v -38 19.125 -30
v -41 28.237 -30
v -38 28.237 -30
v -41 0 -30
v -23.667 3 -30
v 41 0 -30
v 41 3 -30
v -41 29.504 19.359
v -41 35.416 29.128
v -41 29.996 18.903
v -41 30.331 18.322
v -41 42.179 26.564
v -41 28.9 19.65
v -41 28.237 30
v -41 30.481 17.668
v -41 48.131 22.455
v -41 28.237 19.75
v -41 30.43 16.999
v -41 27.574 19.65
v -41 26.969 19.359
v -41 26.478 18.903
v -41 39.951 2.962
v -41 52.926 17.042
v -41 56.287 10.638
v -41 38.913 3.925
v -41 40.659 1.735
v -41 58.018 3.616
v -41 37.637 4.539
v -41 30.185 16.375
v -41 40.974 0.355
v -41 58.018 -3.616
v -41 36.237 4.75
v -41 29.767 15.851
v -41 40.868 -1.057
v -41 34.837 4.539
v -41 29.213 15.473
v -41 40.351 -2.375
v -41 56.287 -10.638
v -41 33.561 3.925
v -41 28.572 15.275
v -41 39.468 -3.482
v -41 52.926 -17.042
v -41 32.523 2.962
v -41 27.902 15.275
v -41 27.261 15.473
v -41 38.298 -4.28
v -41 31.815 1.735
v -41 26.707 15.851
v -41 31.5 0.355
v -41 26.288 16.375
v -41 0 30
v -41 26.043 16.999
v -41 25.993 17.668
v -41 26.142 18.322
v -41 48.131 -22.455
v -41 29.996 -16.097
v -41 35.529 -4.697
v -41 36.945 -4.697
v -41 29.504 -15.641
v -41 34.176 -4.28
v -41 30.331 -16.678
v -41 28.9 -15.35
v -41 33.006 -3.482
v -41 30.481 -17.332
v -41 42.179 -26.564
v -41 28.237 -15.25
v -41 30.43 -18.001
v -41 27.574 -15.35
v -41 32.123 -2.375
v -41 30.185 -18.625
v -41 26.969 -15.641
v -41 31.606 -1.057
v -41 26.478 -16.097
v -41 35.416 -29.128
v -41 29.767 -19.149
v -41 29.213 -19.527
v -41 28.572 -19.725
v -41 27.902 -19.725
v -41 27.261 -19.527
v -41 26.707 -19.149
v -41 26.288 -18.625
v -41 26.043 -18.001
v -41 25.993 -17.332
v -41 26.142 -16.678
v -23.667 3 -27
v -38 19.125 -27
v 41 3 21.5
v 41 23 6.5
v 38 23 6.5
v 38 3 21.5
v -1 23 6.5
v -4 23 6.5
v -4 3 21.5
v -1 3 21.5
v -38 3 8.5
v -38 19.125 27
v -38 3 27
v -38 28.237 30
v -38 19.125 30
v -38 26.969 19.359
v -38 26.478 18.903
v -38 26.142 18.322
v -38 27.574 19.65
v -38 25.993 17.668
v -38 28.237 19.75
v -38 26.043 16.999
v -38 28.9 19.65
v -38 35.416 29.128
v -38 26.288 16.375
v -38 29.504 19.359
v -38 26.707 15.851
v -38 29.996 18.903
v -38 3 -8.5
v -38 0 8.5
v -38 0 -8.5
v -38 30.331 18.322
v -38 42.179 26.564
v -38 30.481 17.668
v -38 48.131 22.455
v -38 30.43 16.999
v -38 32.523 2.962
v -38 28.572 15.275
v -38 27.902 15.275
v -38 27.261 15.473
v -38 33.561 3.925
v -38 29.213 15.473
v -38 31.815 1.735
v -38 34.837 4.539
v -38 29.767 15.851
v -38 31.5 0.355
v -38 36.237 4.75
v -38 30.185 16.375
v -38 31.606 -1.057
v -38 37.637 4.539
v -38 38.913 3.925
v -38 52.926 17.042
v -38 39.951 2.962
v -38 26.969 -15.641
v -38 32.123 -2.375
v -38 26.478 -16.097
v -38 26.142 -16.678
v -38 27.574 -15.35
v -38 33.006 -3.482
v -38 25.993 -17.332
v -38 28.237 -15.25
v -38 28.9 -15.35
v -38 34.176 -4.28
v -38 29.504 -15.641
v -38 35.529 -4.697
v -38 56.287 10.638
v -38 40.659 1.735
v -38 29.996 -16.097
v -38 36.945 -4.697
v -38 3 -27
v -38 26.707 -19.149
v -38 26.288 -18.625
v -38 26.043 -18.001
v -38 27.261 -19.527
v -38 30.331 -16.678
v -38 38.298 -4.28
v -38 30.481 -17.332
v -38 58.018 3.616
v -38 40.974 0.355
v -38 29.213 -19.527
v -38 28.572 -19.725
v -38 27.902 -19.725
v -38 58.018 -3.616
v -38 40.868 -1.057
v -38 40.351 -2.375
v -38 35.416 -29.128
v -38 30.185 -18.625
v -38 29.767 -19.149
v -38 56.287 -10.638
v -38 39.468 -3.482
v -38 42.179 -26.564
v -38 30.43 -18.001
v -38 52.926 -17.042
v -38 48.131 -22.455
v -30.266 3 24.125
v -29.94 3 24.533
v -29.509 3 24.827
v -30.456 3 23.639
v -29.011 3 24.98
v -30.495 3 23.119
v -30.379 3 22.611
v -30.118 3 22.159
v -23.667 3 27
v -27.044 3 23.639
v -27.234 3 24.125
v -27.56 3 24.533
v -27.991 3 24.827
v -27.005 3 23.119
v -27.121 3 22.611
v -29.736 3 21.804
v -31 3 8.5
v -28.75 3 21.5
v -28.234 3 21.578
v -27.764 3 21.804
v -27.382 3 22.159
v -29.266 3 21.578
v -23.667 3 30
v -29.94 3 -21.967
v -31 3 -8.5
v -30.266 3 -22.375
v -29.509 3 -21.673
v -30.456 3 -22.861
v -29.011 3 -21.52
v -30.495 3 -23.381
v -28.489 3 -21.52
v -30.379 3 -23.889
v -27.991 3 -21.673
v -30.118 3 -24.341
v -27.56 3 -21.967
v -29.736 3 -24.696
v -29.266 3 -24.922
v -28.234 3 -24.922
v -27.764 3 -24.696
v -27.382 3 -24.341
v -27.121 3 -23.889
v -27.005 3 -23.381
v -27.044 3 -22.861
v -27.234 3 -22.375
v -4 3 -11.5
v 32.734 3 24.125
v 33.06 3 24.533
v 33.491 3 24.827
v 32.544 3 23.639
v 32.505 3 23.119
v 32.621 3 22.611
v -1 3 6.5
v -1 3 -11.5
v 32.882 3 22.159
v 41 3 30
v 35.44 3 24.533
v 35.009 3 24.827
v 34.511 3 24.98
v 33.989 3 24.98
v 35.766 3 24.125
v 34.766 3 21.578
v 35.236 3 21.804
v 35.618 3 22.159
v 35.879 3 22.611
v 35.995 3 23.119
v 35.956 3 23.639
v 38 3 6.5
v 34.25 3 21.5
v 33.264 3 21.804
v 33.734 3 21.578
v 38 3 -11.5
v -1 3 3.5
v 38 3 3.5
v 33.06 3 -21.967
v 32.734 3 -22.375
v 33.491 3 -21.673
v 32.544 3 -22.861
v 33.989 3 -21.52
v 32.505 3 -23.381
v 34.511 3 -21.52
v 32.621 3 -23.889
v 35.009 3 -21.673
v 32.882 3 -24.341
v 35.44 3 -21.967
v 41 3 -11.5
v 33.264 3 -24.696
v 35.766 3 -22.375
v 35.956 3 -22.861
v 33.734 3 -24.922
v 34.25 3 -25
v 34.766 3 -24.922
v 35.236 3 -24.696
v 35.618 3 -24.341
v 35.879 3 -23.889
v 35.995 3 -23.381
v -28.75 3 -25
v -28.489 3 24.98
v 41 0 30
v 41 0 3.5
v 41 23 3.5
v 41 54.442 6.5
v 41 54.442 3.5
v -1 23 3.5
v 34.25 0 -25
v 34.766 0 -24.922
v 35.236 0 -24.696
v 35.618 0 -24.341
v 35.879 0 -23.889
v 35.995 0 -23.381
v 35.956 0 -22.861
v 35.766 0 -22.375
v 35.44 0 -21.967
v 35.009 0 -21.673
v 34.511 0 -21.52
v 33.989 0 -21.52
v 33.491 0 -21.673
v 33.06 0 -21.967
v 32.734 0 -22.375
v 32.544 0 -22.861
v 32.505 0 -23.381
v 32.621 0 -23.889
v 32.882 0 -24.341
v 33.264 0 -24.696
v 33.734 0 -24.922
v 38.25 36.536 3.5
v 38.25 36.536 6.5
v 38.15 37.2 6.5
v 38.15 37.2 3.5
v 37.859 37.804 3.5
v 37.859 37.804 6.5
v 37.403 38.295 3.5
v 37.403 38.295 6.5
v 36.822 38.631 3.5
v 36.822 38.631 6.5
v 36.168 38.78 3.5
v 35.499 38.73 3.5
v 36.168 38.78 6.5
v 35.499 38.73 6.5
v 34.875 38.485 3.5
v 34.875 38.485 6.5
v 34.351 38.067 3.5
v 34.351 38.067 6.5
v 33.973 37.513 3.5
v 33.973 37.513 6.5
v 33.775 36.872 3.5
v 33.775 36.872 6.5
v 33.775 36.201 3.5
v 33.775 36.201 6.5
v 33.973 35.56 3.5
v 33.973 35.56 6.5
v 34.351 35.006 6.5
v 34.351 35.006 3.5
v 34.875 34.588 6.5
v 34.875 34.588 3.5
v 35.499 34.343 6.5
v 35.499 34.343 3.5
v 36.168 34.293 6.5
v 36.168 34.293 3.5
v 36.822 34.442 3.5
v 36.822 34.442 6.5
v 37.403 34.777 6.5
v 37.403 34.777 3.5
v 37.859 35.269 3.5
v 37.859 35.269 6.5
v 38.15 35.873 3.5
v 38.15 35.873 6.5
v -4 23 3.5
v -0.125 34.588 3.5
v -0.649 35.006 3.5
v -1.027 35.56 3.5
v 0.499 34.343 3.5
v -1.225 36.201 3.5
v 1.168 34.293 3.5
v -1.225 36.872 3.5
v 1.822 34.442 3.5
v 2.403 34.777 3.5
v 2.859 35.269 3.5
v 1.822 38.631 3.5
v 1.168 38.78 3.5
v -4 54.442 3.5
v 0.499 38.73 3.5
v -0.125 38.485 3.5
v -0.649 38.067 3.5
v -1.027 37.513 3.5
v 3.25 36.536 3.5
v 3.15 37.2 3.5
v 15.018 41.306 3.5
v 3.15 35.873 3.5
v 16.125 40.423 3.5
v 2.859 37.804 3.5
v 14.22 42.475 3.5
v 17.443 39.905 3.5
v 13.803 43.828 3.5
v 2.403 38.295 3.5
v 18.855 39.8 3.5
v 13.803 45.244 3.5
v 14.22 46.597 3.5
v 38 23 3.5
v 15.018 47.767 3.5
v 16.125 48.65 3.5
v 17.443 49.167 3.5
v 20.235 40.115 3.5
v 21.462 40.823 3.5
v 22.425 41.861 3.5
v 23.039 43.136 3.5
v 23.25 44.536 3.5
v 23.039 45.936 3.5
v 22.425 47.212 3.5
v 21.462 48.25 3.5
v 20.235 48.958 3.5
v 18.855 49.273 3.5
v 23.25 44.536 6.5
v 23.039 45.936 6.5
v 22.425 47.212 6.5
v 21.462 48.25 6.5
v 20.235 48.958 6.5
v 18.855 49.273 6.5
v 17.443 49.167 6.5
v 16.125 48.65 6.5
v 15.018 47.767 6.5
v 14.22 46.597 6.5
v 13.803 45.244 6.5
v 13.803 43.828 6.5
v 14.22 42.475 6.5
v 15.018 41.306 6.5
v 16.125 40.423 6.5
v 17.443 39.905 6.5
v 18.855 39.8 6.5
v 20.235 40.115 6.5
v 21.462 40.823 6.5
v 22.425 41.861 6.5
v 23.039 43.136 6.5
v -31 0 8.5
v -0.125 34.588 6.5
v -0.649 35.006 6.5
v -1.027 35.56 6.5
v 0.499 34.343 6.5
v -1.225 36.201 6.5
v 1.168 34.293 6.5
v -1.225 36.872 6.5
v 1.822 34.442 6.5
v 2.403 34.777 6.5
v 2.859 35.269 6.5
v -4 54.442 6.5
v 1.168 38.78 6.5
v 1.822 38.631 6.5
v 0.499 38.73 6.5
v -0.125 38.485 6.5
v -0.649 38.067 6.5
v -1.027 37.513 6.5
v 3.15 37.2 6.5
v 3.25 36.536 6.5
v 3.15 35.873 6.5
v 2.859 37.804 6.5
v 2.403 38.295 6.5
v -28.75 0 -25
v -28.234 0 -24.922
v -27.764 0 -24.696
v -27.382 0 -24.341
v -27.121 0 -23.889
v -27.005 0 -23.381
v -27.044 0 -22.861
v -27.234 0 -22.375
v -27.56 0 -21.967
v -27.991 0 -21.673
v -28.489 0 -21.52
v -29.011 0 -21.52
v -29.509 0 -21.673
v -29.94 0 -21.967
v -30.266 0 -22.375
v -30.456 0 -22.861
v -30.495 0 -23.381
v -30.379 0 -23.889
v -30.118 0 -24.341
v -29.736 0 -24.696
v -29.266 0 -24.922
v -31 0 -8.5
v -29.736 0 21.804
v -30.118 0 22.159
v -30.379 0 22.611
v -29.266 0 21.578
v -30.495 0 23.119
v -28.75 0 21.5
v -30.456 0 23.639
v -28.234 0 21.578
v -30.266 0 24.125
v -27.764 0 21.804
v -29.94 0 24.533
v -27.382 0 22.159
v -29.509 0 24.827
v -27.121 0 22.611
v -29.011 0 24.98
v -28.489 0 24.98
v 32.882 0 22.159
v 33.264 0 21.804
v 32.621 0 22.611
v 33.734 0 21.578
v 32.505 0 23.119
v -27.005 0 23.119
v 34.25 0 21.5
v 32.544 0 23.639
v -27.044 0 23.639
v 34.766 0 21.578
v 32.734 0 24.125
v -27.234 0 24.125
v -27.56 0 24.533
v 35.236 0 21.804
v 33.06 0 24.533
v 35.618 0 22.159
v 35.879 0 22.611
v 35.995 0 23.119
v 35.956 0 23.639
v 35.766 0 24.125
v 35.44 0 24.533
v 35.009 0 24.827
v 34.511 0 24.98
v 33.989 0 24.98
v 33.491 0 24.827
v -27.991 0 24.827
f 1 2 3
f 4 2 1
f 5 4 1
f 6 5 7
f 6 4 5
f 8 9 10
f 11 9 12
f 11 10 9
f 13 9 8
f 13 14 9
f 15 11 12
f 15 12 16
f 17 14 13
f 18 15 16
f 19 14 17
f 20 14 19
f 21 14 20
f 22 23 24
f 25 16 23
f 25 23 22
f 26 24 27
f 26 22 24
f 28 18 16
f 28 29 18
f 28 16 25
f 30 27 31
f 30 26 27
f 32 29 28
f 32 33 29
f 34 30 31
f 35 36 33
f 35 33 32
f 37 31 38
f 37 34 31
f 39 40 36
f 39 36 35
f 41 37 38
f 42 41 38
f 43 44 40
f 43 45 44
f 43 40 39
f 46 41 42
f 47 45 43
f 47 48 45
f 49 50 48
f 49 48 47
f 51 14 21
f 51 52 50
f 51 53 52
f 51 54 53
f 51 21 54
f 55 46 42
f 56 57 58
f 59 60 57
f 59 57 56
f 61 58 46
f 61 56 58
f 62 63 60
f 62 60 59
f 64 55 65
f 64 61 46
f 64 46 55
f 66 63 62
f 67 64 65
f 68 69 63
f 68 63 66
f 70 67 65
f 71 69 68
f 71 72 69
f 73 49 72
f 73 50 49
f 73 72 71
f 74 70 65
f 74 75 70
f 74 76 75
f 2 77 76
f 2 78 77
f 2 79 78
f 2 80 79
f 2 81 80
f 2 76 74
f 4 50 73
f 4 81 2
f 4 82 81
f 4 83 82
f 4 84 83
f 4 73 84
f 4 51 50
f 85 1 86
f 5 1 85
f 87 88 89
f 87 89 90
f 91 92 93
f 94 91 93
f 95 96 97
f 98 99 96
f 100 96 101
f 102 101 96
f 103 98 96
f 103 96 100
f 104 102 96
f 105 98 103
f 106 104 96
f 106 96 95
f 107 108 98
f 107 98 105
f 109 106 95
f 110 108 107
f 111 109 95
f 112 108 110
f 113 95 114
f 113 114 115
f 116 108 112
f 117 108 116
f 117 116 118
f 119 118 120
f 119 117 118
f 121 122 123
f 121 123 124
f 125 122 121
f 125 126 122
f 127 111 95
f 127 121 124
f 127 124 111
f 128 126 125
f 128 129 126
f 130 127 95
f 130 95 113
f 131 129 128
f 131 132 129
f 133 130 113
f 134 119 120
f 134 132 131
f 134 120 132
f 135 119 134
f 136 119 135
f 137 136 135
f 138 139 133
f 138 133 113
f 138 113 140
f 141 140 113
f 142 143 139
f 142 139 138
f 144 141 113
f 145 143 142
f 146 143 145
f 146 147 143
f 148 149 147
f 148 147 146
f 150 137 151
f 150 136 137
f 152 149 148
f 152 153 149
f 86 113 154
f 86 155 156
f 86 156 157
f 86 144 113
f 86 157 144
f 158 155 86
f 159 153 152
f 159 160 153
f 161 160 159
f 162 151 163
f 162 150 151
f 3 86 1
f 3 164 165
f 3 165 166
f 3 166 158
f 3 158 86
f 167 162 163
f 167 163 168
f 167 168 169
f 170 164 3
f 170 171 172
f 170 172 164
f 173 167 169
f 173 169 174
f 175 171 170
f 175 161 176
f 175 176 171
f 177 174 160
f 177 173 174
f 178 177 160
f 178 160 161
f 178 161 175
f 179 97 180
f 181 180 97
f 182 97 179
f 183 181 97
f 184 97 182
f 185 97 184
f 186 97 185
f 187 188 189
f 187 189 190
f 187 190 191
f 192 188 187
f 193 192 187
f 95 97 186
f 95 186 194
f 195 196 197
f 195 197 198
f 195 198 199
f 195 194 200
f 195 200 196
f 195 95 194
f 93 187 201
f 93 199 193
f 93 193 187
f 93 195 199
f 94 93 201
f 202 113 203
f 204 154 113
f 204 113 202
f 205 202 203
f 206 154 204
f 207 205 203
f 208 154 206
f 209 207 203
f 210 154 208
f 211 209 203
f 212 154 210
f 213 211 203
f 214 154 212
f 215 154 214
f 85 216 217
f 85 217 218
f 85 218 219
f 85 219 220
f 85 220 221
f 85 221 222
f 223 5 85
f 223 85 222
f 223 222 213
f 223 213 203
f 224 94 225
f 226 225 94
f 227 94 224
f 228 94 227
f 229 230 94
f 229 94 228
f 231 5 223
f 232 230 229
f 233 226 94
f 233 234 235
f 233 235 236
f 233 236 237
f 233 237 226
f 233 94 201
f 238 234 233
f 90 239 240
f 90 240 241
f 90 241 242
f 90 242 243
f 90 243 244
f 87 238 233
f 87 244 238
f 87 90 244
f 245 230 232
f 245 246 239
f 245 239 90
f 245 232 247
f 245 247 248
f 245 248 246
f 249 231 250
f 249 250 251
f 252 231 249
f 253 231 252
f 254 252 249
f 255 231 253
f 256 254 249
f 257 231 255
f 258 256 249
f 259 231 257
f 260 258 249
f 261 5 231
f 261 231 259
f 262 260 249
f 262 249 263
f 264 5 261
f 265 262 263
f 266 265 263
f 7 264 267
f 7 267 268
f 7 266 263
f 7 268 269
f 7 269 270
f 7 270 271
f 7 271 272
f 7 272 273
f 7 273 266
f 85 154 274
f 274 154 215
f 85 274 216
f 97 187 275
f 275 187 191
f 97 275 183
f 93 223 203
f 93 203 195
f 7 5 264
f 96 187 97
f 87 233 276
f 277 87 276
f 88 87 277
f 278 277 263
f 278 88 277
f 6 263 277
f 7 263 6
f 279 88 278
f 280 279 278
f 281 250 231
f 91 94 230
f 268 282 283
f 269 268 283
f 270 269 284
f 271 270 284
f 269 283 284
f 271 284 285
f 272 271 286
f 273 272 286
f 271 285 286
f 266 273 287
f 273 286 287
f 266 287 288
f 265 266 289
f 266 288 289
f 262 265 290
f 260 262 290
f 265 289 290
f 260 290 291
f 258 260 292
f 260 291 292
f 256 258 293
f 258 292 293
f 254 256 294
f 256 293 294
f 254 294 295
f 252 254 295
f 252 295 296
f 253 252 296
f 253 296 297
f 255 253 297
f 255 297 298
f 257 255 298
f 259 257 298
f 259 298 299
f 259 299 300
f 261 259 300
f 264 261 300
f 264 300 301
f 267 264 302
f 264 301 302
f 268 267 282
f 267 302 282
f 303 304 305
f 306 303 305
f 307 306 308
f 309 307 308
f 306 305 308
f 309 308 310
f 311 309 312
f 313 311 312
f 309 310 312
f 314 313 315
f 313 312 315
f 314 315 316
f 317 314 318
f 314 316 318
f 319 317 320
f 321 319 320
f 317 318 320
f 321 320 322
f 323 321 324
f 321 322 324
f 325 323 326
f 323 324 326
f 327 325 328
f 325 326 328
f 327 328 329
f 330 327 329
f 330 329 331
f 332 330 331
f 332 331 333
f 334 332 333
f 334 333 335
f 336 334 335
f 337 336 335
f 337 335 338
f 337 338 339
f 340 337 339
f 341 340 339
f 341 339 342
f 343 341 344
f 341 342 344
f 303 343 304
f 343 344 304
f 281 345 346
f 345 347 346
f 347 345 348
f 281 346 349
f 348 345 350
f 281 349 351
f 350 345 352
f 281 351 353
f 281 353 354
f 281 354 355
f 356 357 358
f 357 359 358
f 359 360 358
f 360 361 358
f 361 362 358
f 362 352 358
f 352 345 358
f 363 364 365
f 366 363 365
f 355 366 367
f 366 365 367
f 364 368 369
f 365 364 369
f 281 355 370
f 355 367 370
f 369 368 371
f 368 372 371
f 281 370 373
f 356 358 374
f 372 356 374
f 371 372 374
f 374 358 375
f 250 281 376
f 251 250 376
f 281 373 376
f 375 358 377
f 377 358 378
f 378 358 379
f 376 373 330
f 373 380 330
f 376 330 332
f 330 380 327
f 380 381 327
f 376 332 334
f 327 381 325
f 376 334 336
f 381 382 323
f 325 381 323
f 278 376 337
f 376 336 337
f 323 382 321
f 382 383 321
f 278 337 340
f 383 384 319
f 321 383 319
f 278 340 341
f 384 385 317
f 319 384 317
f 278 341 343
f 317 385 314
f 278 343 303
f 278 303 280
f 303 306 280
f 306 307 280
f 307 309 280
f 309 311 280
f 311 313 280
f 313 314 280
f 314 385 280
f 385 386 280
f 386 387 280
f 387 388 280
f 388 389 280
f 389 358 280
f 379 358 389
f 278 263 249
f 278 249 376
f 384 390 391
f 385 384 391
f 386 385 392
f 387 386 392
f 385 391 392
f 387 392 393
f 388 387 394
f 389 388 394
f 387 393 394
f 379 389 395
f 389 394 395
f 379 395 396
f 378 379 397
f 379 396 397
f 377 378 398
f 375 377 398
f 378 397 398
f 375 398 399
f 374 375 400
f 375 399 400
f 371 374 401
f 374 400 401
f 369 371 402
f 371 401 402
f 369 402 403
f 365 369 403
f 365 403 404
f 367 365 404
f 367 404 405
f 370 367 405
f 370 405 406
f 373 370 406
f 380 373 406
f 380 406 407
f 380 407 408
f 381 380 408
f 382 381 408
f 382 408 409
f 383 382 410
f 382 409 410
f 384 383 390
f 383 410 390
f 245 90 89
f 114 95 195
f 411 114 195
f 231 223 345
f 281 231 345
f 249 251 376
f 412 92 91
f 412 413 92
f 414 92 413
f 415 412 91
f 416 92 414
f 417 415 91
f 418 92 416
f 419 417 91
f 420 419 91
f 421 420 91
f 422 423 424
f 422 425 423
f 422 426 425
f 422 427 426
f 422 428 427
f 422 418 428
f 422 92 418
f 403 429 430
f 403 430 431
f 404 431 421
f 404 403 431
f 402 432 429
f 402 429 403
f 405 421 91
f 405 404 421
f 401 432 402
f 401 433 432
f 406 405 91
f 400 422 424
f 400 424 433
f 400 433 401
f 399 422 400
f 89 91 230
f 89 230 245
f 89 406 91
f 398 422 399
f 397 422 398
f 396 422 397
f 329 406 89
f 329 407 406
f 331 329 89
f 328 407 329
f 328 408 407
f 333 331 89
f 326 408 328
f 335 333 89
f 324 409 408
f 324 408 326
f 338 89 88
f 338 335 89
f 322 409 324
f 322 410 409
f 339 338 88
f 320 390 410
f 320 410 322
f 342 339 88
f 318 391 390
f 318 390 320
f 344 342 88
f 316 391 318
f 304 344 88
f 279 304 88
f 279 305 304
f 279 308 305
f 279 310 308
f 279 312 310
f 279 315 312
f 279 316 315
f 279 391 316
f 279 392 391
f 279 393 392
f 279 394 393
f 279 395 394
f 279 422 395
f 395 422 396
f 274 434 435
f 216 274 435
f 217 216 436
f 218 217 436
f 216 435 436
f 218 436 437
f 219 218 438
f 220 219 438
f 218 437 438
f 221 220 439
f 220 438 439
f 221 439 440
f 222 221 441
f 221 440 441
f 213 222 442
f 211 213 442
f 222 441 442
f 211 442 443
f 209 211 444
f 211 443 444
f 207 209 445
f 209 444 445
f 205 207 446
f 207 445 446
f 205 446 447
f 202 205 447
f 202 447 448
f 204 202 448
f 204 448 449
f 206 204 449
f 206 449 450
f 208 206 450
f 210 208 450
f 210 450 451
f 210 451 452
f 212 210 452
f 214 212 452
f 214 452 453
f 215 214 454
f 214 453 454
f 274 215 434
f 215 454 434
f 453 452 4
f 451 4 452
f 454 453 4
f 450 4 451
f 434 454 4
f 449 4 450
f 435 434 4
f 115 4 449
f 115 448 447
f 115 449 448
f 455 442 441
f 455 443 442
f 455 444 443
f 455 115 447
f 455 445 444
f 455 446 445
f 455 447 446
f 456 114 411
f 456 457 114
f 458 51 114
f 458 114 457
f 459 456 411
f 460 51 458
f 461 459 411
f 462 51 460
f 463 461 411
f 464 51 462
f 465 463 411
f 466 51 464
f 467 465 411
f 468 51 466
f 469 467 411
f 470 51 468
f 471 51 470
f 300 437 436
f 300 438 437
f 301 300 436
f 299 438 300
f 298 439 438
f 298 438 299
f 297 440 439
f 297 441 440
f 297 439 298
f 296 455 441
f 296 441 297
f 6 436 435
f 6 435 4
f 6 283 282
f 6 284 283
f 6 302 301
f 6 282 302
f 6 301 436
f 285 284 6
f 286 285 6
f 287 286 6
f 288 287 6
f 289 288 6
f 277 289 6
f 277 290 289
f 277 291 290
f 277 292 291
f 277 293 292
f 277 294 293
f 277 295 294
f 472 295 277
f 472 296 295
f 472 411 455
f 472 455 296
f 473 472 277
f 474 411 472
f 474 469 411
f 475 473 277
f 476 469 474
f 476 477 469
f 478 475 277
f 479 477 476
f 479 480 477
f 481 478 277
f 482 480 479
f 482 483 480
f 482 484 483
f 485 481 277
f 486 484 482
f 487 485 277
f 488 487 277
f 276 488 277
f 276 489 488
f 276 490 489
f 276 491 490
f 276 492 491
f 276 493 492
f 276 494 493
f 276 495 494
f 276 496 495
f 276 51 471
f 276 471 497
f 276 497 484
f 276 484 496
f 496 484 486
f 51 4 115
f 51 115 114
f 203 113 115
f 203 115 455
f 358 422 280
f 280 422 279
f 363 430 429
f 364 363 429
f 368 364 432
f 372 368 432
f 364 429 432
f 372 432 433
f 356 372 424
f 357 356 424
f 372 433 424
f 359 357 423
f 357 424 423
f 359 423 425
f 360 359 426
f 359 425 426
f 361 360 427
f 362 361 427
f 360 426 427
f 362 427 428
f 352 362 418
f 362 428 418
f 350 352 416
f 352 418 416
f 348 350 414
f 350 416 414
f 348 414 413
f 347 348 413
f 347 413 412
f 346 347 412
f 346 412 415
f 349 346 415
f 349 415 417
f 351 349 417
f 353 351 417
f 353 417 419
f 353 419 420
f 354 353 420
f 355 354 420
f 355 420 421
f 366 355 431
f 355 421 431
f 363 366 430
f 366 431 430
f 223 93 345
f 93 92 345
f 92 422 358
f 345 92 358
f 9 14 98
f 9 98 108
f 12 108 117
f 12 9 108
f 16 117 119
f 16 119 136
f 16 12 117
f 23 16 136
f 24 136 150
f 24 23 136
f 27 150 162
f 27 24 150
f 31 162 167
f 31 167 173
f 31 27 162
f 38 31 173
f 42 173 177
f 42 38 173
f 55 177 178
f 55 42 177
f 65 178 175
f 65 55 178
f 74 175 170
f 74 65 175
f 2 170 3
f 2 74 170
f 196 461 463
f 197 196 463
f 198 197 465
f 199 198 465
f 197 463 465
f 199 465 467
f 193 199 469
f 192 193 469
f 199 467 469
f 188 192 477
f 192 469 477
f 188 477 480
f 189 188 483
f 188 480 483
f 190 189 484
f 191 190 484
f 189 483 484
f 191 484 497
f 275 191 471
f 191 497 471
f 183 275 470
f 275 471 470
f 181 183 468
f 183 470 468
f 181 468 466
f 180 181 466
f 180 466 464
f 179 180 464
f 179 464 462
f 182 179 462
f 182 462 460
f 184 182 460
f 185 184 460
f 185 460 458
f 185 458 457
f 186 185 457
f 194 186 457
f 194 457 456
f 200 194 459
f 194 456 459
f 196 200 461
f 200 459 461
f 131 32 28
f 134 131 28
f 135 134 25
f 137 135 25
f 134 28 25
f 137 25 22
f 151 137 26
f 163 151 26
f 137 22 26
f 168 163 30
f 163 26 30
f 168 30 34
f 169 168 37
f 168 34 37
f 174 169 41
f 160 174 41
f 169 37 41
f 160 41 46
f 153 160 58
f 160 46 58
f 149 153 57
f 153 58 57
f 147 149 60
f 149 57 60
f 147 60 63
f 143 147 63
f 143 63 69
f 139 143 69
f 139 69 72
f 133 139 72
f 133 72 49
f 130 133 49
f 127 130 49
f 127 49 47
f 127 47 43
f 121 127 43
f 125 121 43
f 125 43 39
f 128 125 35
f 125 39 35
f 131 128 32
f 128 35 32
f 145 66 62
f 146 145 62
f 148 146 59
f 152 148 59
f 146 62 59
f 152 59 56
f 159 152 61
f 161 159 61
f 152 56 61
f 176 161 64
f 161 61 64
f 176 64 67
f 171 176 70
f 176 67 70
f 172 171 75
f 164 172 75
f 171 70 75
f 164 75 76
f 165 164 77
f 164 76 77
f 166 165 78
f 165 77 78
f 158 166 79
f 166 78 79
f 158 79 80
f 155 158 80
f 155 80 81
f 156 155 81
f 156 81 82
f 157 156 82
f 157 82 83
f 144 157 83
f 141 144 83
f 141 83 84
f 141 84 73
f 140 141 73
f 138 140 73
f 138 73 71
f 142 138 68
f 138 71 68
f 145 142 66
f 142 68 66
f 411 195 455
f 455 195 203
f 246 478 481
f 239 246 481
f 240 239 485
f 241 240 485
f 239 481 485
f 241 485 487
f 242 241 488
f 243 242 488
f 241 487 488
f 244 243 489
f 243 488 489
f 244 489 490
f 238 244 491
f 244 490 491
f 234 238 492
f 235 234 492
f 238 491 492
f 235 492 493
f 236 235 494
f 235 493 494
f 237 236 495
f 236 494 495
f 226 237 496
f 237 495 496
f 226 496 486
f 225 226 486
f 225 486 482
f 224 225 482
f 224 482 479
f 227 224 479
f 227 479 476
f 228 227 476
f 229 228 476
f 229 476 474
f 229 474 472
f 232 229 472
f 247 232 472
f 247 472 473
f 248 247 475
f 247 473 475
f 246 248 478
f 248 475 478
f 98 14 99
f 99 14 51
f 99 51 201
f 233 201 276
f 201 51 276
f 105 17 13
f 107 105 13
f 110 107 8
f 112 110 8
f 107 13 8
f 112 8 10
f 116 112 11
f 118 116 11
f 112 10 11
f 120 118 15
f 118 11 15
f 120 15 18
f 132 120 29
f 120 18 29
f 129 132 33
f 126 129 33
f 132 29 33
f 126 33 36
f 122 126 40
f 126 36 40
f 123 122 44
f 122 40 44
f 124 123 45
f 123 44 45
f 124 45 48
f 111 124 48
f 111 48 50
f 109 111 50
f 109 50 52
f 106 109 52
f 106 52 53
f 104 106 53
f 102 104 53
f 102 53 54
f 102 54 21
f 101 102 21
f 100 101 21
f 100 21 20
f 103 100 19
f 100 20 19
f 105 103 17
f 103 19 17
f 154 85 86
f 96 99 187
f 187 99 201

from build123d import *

# Parameters (mm, degrees)
SKETCH1_W           = 82
SKETCH1_H           = 60
BOSS_EXTRUDE1_DEPTH = 3
BOSS_EXTRUDE2_DEPTH = 3
SKETCH3_R           = 2.25
SKETCH3_R_2         = 4.75
BOSS_EXTRUDE3_DEPTH = 3
SKETCH4_W           = 7
SKETCH4_H           = 17
CUT_EXTRUDE1_DEPTH  = 3
BOSS_EXTRUDE4_START = -23.5
SKETCH5_W           = 45
SKETCH5_H           = 54.441667663
BOSS_EXTRUDE4_DEPTH = 3
SKETCH6_R           = 2.25
SKETCH6_R_2         = 4.75
CUT_EXTRUDE2_DEPTH  = 3
BOSS_EXTRUDE5_DEPTH = 3
SKETCH8_R           = 1.75
CUT_EXTRUDE3_DEPTH  = 3


with BuildPart() as part:
    # Sketch1 → Boss-Extrude1 (new body)
    with BuildSketch(Plane(origin=(0, 0, 0), x_dir=(1, 0, 0), z_dir=(0, 1, 0))):
        Rectangle(SKETCH1_W, SKETCH1_H)
    extrude(amount=BOSS_EXTRUDE1_DEPTH)

    # Sketch2 → Boss-Extrude2 (add)
    with BuildSketch(Plane.XY.offset(30)):
        Polygon((-41, 0), (-41, 22.5), (-21, 0), align=None)
    boss_extrude2 = extrude(amount=-BOSS_EXTRUDE2_DEPTH)

    # Mirror1: Boss-Extrude2 across plane
    add(boss_extrude2.mirror(Plane.XY))

    # Sketch3 → Boss-Extrude3 (add)
    with BuildSketch(Plane.ZY.offset(41)):
        with BuildLine():
            Line((-30, 0), (30, 0))
            Line((30, 0), (30, 28.236891946))
            ThreePointArc((30, 28.236891946), (0, 58.236891946), (-30, 28.236891946))
            Line((-30, 28.236891946), (-30, 0))
        make_face()
        with Locations((-17.5, 28.236891946)):
            Circle(SKETCH3_R, mode=Mode.SUBTRACT)
        with Locations((17.5, 28.236891946)):
            Circle(SKETCH3_R, mode=Mode.SUBTRACT)
        with Locations((0, 36.236891946)):
            Circle(SKETCH3_R_2, mode=Mode.SUBTRACT)
    extrude(amount=-BOSS_EXTRUDE3_DEPTH)

    # Sketch4 → Cut-Extrude1 (cut)
    with BuildSketch(Plane(origin=(0, 3, 0), x_dir=(1, 0, 0), z_dir=(0, 1, 0))):
        with Locations((-34.5, 0)):
            Rectangle(SKETCH4_W, SKETCH4_H)
    extrude(amount=-CUT_EXTRUDE1_DEPTH, mode=Mode.SUBTRACT)

    # Sketch5 → Boss-Extrude4 (add)
    with BuildSketch(Plane.XY.offset(30).offset(BOSS_EXTRUDE4_START)):
        with Locations((18.5, 27.220833832)):
            Rectangle(SKETCH5_W, SKETCH5_H)
    extrude(amount=-BOSS_EXTRUDE4_DEPTH)

    # Sketch6 → Cut-Extrude2 (cut)
    with BuildSketch(Plane.XY.offset(6.5)):
        with Locations((1, 36.536359397)):
            Circle(SKETCH6_R)
        with Locations((36, 36.536359397)):
            Circle(SKETCH6_R)
        with Locations((18.5, 44.536359397)):
            Circle(SKETCH6_R_2)
    extrude(amount=-CUT_EXTRUDE2_DEPTH, mode=Mode.SUBTRACT)

    # Sketch7 → Boss-Extrude5 (add)
    with BuildSketch(Plane(origin=(41, 0, 0), x_dir=(0, 0, -1), z_dir=(1, 0, 0))):
        Polygon((-21.5, 3), (-6.5, 3), (-6.5, 23), align=None)
        Polygon((-3.5, 3), (11.5, 3), (-3.5, 23), align=None)
    boss_extrude5 = extrude(amount=-BOSS_EXTRUDE5_DEPTH)

    # Mirror2: Boss-Extrude5 across plane
    add(boss_extrude5.mirror(Plane.ZY.offset(-18.5)))

    # Sketch8 → Cut-Extrude3 (cut)
    with BuildSketch(Plane.XZ):
        with Locations(Location((-28.75, 23.25, 0), (0, 0, 270))):
            Circle(SKETCH8_R)
        with Locations(Location((34.25, 23.25, 0), (0, 0, 270))):
            Circle(SKETCH8_R)
        with Locations(Location((34.25, -23.25, 0), (0, 0, 270))):
            Circle(SKETCH8_R)
        with Locations(Location((-28.75, -23.25, 0), (0, 0, 270))):
            Circle(SKETCH8_R)
    extrude(amount=-CUT_EXTRUDE3_DEPTH, mode=Mode.SUBTRACT)


solid = part.part
